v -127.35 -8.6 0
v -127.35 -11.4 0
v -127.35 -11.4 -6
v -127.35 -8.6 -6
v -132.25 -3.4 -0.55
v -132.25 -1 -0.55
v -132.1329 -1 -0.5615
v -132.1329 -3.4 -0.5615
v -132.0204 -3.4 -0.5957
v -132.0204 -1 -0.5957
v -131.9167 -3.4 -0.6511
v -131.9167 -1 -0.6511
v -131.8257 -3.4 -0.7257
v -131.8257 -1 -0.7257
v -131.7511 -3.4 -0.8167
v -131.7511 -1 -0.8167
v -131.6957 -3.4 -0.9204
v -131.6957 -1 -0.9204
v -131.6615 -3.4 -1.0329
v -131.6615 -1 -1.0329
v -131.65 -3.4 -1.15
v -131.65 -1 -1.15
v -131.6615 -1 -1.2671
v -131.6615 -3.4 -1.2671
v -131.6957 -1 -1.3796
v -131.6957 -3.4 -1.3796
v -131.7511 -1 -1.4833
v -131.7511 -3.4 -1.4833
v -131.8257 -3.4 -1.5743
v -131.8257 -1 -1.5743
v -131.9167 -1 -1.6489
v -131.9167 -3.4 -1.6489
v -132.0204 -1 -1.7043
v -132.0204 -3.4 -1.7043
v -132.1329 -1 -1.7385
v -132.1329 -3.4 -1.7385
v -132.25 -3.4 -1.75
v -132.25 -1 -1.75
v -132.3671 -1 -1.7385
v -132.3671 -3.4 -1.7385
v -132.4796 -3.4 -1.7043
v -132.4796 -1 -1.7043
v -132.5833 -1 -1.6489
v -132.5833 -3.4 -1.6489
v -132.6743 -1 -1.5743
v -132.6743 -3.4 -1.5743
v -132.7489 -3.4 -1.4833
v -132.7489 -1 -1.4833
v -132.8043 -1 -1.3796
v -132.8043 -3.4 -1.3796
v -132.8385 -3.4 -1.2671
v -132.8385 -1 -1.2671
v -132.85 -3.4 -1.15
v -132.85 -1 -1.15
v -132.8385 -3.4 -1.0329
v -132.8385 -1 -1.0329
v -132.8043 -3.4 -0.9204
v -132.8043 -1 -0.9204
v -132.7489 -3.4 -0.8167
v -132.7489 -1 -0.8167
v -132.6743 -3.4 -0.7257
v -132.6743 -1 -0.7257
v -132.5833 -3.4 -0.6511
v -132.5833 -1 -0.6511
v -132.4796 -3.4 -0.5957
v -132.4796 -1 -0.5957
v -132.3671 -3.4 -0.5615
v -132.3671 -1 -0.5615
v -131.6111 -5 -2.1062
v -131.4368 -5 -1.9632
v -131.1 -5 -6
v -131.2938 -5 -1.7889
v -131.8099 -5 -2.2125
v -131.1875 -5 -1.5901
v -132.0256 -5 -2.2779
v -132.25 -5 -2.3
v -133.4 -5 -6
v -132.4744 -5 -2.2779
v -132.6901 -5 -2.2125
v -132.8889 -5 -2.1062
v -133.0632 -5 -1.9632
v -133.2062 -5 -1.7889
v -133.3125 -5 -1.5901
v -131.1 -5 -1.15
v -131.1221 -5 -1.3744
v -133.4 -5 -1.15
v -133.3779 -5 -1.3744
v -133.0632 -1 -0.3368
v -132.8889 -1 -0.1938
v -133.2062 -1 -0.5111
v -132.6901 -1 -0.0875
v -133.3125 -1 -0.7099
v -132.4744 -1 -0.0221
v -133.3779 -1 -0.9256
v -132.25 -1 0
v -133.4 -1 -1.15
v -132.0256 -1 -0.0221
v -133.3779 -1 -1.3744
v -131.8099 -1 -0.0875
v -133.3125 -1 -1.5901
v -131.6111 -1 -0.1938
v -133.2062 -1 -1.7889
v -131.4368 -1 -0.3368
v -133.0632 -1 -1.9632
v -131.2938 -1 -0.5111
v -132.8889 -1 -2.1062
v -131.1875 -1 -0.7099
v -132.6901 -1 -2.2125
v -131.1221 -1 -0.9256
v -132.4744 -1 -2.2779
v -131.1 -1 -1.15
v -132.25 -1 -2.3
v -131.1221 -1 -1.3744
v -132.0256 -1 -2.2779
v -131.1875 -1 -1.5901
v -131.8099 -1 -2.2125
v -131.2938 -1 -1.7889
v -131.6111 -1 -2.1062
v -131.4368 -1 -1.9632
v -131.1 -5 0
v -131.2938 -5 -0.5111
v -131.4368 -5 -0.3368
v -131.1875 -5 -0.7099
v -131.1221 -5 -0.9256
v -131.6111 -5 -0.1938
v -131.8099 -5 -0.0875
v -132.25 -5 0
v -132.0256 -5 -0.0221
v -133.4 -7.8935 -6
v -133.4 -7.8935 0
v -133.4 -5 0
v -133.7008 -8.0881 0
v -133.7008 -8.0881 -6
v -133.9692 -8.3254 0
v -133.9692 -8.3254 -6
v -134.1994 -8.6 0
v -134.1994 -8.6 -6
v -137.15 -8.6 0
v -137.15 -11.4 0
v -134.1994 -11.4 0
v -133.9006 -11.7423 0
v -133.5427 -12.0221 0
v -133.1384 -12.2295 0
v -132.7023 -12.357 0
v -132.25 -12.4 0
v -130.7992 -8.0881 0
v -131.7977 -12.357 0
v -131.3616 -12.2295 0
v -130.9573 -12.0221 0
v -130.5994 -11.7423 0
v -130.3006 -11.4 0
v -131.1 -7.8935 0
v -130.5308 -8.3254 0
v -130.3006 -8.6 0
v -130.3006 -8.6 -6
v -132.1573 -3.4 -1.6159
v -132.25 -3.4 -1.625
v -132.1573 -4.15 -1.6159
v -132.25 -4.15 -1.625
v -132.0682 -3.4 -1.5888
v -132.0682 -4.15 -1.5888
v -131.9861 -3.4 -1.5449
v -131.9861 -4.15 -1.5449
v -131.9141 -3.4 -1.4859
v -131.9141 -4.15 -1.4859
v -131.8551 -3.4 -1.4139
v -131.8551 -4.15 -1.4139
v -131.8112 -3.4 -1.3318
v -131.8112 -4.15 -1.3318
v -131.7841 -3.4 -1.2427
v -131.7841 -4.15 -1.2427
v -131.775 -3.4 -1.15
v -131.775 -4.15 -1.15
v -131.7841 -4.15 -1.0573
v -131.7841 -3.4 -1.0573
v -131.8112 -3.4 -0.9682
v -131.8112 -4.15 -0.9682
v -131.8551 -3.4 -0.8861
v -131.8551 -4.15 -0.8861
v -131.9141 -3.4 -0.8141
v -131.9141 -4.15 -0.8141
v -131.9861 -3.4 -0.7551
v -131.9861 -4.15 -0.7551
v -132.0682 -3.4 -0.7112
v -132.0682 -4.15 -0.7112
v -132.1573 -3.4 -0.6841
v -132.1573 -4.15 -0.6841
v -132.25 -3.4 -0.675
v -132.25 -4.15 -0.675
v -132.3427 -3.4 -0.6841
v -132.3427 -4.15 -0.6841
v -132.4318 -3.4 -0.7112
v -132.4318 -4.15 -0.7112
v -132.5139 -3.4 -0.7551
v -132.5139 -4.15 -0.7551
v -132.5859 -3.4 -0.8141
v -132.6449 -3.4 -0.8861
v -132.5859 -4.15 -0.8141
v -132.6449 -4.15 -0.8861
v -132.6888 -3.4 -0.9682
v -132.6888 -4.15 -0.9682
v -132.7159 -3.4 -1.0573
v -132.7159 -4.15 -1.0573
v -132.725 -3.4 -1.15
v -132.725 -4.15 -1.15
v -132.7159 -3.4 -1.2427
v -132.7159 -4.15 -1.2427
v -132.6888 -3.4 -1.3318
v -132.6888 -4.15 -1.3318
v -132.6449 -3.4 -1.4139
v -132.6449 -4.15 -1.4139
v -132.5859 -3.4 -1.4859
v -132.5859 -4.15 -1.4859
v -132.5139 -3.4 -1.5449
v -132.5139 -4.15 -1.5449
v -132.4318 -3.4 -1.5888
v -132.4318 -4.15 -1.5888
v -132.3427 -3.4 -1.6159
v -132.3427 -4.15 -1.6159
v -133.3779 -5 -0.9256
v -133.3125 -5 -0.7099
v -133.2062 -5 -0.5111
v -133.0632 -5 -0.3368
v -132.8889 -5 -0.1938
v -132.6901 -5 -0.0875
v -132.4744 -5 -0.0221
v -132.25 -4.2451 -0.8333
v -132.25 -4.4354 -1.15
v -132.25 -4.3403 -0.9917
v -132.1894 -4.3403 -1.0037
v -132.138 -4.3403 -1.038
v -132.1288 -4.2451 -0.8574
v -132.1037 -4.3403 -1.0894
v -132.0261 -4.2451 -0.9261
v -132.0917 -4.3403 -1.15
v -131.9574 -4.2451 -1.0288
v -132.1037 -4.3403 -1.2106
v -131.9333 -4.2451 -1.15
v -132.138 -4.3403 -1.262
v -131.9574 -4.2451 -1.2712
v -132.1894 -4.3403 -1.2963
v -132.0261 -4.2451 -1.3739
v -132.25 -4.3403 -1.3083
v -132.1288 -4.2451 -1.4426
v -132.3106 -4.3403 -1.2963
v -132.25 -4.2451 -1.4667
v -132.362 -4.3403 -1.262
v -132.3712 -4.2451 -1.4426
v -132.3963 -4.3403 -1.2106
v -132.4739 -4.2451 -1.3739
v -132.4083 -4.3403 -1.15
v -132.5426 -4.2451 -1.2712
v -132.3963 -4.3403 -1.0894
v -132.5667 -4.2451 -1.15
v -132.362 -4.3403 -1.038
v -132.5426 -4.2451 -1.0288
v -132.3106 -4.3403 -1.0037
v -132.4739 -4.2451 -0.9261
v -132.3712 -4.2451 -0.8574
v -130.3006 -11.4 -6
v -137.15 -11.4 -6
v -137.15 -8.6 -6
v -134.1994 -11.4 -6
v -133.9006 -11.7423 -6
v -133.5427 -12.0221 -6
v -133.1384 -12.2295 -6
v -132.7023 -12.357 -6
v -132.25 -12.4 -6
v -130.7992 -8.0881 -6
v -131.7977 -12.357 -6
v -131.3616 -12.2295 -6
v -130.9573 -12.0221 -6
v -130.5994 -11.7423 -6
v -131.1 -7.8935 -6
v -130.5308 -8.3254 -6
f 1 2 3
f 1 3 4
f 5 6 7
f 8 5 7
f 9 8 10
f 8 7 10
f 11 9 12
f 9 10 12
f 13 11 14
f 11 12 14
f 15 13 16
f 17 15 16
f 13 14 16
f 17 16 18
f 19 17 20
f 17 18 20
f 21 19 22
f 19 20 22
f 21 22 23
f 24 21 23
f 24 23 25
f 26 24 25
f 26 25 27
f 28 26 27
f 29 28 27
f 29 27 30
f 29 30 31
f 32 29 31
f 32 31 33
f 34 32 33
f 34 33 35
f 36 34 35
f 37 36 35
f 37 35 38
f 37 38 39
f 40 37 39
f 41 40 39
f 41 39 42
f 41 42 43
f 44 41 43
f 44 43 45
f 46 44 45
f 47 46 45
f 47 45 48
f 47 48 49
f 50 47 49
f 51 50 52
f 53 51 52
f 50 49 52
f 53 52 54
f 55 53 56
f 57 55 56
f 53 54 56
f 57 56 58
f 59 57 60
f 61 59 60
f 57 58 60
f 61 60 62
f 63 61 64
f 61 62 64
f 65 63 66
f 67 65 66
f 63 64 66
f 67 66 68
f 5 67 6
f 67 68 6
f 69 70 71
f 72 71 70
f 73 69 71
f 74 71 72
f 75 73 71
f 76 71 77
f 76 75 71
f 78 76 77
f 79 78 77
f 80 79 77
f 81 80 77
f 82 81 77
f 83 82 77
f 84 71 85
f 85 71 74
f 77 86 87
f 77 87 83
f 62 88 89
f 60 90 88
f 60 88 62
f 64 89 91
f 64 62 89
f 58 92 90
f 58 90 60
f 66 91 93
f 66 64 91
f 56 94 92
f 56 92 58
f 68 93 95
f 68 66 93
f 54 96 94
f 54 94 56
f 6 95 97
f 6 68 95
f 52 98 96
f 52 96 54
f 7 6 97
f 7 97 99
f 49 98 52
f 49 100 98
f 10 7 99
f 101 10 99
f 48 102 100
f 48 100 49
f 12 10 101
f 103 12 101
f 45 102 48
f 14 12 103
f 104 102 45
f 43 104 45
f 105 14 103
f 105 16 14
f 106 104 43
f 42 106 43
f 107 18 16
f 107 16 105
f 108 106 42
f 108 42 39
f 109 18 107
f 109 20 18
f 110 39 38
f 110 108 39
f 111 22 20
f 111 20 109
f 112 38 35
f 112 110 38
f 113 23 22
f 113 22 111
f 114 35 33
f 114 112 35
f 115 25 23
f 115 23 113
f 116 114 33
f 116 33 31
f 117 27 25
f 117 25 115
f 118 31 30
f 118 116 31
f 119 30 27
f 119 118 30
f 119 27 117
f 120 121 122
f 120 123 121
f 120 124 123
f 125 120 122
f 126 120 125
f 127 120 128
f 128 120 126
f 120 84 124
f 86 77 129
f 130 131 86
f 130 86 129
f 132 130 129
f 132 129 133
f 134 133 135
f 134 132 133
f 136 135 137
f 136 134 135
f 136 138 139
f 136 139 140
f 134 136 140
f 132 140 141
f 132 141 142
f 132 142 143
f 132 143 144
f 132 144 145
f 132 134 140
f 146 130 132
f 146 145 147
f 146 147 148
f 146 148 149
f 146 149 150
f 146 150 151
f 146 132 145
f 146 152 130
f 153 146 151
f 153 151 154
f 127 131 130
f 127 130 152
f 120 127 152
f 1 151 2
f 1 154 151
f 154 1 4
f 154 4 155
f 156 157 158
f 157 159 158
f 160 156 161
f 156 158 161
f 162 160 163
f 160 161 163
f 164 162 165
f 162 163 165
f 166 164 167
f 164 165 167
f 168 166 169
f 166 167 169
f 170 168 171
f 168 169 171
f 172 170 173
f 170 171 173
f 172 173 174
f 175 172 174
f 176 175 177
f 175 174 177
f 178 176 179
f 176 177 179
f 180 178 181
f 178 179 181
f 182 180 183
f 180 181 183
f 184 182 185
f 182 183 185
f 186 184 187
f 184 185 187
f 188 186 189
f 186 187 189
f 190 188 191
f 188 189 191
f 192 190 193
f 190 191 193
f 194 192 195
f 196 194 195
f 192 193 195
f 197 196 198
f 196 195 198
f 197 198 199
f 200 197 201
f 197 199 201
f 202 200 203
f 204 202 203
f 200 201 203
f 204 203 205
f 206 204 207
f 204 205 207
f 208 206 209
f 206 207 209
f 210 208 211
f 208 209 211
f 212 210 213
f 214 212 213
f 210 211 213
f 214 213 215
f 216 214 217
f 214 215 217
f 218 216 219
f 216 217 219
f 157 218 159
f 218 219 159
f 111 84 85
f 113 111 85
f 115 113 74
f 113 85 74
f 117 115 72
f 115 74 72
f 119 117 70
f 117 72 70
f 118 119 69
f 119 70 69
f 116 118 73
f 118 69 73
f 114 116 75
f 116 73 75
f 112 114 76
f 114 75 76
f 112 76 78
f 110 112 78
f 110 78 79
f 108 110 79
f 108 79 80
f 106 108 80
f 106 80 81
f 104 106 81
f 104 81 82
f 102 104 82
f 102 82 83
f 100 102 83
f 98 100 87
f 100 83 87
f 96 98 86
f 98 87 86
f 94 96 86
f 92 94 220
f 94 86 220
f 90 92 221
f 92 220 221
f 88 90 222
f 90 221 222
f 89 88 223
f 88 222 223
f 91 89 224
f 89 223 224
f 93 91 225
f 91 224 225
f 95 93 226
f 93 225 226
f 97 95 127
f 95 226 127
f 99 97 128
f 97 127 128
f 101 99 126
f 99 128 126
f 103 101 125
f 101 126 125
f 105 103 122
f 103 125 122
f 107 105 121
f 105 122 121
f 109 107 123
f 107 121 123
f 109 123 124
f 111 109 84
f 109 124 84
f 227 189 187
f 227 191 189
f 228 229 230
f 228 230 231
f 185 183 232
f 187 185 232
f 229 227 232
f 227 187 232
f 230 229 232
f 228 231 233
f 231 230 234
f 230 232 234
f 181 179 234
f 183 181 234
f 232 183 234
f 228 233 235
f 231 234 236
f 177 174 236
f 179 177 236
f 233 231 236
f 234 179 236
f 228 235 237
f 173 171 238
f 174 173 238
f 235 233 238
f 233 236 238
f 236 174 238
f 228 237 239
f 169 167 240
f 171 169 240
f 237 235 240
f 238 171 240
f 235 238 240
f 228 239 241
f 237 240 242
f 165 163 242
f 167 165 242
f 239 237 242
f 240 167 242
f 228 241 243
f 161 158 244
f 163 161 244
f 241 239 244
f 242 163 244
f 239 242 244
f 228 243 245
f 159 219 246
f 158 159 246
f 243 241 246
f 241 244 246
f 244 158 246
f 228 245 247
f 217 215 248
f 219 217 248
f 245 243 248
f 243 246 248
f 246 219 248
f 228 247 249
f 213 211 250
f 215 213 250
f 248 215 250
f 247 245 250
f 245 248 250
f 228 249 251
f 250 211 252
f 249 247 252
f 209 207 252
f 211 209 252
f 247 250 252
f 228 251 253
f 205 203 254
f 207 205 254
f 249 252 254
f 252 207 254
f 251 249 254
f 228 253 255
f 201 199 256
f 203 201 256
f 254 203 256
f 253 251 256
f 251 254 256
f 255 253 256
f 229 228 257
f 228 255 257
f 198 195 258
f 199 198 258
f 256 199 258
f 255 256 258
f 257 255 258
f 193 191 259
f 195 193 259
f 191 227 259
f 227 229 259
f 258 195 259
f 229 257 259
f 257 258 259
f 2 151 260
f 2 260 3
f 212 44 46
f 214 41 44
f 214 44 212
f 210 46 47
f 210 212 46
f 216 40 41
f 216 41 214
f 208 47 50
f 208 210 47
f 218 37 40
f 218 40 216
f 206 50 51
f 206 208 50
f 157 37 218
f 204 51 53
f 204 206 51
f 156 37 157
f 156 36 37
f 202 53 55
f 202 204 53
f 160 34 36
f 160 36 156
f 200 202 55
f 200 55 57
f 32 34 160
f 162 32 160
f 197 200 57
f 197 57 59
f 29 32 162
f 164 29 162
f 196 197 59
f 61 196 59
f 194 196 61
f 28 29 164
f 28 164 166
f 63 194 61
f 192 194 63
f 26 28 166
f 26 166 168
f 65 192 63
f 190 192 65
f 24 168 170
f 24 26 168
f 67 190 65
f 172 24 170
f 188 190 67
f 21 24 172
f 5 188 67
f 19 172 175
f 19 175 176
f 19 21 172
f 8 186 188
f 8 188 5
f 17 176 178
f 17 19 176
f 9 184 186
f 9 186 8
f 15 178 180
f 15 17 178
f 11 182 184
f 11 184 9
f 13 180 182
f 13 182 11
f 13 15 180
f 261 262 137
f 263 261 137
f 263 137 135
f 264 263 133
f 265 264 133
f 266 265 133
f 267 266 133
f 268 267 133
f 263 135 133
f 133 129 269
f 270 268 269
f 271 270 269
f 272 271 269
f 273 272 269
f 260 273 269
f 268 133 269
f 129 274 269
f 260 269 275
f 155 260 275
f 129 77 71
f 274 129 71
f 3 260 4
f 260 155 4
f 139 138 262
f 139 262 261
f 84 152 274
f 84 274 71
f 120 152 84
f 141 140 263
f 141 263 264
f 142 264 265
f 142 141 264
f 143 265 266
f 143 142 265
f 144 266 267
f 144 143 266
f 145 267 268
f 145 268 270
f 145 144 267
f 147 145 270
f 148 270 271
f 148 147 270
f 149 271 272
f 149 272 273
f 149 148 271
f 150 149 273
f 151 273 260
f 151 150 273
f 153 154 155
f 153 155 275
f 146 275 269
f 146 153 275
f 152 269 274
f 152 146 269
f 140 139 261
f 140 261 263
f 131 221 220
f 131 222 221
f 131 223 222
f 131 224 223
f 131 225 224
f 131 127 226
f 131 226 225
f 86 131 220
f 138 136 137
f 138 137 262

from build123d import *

# Parameters (mm, degrees)
BOSS_EXTRUDE1_DEPTH                = 6
BOSS_EXTRUDE2_DEPTH                = 4
M1_2X0_25_TAPPED_HOLE1_D           = 0.95
M1_2X0_25_TAPPED_HOLE1_DEPTH       = 3.15
M1_2X0_25_TAPPED_HOLE1_CBORE_D     = 1.2
M1_2X0_25_TAPPED_HOLE1_CBORE_DEPTH = 2.4
M1_2X0_25_TAPPED_HOLE1_TIP         = 0.285408794


with BuildPart() as part:
    # Sketch2 → Boss-Extrude1 (new body)
    with BuildSketch(Plane.XY):
        with BuildLine():
            Line((-131.1, -7.893462557), (-131.1, -5))
            Line((-131.1, -5), (-133.4, -5))
            Line((-133.4, -5), (-133.4, -7.893462557))
            ThreePointArc((-133.4, -7.893462557), (-133.839435478, -8.201752281), (-134.199358869, -8.6))
            Line((-134.199358869, -8.6), (-137.15, -8.6))
            Line((-137.15, -8.6), (-137.15, -11.4))
            Line((-137.15, -11.4), (-134.199358869, -11.4))
            ThreePointArc((-134.199358869, -11.4), (-132.25, -12.4), (-130.300641131, -11.4))
            Line((-130.300641131, -11.4), (-127.35, -11.4))
            Line((-127.35, -11.4), (-127.35, -8.6))
            Line((-127.35, -8.6), (-130.300641131, -8.6))
            ThreePointArc((-130.300641131, -8.6), (-130.660564522, -8.201752281), (-131.1, -7.893462557))
        make_face()
    extrude(amount=-BOSS_EXTRUDE1_DEPTH)

    # Sketch3 → Boss-Extrude2 (add)
    with BuildSketch(Plane(origin=(0, -5, 0), x_dir=(1, 0, 0), z_dir=(0, 1, 0))):
        with BuildLine():
            ThreePointArc((-133.4, 1.15), (-132.25, 0), (-131.1, 1.15))
            Line((-131.1, 1.15), (-133.4, 1.15))
        make_face()
        with BuildLine():
            Line((-133.4, 1.15), (-131.1, 1.15))
            ThreePointArc((-131.1, 1.15), (-132.25, 2.3), (-133.4, 1.15))
        make_face()
    extrude(amount=BOSS_EXTRUDE2_DEPTH)

    # M1.2x0.25 Tapped Hole1
    with Locations(Plane(origin=(-132.25, -1, -1.15), x_dir=(0, 0, 1), z_dir=(0, 1, 0))):
        with Locations((0, 0)):
            CounterBoreHole(M1_2X0_25_TAPPED_HOLE1_D / 2, M1_2X0_25_TAPPED_HOLE1_CBORE_D / 2, M1_2X0_25_TAPPED_HOLE1_CBORE_DEPTH, depth=M1_2X0_25_TAPPED_HOLE1_DEPTH)
            with Locations((0, 0, -(M1_2X0_25_TAPPED_HOLE1_DEPTH + M1_2X0_25_TAPPED_HOLE1_TIP / 2))):  # 118° drill point
                Cone(0, M1_2X0_25_TAPPED_HOLE1_D / 2, M1_2X0_25_TAPPED_HOLE1_TIP, mode=Mode.SUBTRACT)


solid = part.part
